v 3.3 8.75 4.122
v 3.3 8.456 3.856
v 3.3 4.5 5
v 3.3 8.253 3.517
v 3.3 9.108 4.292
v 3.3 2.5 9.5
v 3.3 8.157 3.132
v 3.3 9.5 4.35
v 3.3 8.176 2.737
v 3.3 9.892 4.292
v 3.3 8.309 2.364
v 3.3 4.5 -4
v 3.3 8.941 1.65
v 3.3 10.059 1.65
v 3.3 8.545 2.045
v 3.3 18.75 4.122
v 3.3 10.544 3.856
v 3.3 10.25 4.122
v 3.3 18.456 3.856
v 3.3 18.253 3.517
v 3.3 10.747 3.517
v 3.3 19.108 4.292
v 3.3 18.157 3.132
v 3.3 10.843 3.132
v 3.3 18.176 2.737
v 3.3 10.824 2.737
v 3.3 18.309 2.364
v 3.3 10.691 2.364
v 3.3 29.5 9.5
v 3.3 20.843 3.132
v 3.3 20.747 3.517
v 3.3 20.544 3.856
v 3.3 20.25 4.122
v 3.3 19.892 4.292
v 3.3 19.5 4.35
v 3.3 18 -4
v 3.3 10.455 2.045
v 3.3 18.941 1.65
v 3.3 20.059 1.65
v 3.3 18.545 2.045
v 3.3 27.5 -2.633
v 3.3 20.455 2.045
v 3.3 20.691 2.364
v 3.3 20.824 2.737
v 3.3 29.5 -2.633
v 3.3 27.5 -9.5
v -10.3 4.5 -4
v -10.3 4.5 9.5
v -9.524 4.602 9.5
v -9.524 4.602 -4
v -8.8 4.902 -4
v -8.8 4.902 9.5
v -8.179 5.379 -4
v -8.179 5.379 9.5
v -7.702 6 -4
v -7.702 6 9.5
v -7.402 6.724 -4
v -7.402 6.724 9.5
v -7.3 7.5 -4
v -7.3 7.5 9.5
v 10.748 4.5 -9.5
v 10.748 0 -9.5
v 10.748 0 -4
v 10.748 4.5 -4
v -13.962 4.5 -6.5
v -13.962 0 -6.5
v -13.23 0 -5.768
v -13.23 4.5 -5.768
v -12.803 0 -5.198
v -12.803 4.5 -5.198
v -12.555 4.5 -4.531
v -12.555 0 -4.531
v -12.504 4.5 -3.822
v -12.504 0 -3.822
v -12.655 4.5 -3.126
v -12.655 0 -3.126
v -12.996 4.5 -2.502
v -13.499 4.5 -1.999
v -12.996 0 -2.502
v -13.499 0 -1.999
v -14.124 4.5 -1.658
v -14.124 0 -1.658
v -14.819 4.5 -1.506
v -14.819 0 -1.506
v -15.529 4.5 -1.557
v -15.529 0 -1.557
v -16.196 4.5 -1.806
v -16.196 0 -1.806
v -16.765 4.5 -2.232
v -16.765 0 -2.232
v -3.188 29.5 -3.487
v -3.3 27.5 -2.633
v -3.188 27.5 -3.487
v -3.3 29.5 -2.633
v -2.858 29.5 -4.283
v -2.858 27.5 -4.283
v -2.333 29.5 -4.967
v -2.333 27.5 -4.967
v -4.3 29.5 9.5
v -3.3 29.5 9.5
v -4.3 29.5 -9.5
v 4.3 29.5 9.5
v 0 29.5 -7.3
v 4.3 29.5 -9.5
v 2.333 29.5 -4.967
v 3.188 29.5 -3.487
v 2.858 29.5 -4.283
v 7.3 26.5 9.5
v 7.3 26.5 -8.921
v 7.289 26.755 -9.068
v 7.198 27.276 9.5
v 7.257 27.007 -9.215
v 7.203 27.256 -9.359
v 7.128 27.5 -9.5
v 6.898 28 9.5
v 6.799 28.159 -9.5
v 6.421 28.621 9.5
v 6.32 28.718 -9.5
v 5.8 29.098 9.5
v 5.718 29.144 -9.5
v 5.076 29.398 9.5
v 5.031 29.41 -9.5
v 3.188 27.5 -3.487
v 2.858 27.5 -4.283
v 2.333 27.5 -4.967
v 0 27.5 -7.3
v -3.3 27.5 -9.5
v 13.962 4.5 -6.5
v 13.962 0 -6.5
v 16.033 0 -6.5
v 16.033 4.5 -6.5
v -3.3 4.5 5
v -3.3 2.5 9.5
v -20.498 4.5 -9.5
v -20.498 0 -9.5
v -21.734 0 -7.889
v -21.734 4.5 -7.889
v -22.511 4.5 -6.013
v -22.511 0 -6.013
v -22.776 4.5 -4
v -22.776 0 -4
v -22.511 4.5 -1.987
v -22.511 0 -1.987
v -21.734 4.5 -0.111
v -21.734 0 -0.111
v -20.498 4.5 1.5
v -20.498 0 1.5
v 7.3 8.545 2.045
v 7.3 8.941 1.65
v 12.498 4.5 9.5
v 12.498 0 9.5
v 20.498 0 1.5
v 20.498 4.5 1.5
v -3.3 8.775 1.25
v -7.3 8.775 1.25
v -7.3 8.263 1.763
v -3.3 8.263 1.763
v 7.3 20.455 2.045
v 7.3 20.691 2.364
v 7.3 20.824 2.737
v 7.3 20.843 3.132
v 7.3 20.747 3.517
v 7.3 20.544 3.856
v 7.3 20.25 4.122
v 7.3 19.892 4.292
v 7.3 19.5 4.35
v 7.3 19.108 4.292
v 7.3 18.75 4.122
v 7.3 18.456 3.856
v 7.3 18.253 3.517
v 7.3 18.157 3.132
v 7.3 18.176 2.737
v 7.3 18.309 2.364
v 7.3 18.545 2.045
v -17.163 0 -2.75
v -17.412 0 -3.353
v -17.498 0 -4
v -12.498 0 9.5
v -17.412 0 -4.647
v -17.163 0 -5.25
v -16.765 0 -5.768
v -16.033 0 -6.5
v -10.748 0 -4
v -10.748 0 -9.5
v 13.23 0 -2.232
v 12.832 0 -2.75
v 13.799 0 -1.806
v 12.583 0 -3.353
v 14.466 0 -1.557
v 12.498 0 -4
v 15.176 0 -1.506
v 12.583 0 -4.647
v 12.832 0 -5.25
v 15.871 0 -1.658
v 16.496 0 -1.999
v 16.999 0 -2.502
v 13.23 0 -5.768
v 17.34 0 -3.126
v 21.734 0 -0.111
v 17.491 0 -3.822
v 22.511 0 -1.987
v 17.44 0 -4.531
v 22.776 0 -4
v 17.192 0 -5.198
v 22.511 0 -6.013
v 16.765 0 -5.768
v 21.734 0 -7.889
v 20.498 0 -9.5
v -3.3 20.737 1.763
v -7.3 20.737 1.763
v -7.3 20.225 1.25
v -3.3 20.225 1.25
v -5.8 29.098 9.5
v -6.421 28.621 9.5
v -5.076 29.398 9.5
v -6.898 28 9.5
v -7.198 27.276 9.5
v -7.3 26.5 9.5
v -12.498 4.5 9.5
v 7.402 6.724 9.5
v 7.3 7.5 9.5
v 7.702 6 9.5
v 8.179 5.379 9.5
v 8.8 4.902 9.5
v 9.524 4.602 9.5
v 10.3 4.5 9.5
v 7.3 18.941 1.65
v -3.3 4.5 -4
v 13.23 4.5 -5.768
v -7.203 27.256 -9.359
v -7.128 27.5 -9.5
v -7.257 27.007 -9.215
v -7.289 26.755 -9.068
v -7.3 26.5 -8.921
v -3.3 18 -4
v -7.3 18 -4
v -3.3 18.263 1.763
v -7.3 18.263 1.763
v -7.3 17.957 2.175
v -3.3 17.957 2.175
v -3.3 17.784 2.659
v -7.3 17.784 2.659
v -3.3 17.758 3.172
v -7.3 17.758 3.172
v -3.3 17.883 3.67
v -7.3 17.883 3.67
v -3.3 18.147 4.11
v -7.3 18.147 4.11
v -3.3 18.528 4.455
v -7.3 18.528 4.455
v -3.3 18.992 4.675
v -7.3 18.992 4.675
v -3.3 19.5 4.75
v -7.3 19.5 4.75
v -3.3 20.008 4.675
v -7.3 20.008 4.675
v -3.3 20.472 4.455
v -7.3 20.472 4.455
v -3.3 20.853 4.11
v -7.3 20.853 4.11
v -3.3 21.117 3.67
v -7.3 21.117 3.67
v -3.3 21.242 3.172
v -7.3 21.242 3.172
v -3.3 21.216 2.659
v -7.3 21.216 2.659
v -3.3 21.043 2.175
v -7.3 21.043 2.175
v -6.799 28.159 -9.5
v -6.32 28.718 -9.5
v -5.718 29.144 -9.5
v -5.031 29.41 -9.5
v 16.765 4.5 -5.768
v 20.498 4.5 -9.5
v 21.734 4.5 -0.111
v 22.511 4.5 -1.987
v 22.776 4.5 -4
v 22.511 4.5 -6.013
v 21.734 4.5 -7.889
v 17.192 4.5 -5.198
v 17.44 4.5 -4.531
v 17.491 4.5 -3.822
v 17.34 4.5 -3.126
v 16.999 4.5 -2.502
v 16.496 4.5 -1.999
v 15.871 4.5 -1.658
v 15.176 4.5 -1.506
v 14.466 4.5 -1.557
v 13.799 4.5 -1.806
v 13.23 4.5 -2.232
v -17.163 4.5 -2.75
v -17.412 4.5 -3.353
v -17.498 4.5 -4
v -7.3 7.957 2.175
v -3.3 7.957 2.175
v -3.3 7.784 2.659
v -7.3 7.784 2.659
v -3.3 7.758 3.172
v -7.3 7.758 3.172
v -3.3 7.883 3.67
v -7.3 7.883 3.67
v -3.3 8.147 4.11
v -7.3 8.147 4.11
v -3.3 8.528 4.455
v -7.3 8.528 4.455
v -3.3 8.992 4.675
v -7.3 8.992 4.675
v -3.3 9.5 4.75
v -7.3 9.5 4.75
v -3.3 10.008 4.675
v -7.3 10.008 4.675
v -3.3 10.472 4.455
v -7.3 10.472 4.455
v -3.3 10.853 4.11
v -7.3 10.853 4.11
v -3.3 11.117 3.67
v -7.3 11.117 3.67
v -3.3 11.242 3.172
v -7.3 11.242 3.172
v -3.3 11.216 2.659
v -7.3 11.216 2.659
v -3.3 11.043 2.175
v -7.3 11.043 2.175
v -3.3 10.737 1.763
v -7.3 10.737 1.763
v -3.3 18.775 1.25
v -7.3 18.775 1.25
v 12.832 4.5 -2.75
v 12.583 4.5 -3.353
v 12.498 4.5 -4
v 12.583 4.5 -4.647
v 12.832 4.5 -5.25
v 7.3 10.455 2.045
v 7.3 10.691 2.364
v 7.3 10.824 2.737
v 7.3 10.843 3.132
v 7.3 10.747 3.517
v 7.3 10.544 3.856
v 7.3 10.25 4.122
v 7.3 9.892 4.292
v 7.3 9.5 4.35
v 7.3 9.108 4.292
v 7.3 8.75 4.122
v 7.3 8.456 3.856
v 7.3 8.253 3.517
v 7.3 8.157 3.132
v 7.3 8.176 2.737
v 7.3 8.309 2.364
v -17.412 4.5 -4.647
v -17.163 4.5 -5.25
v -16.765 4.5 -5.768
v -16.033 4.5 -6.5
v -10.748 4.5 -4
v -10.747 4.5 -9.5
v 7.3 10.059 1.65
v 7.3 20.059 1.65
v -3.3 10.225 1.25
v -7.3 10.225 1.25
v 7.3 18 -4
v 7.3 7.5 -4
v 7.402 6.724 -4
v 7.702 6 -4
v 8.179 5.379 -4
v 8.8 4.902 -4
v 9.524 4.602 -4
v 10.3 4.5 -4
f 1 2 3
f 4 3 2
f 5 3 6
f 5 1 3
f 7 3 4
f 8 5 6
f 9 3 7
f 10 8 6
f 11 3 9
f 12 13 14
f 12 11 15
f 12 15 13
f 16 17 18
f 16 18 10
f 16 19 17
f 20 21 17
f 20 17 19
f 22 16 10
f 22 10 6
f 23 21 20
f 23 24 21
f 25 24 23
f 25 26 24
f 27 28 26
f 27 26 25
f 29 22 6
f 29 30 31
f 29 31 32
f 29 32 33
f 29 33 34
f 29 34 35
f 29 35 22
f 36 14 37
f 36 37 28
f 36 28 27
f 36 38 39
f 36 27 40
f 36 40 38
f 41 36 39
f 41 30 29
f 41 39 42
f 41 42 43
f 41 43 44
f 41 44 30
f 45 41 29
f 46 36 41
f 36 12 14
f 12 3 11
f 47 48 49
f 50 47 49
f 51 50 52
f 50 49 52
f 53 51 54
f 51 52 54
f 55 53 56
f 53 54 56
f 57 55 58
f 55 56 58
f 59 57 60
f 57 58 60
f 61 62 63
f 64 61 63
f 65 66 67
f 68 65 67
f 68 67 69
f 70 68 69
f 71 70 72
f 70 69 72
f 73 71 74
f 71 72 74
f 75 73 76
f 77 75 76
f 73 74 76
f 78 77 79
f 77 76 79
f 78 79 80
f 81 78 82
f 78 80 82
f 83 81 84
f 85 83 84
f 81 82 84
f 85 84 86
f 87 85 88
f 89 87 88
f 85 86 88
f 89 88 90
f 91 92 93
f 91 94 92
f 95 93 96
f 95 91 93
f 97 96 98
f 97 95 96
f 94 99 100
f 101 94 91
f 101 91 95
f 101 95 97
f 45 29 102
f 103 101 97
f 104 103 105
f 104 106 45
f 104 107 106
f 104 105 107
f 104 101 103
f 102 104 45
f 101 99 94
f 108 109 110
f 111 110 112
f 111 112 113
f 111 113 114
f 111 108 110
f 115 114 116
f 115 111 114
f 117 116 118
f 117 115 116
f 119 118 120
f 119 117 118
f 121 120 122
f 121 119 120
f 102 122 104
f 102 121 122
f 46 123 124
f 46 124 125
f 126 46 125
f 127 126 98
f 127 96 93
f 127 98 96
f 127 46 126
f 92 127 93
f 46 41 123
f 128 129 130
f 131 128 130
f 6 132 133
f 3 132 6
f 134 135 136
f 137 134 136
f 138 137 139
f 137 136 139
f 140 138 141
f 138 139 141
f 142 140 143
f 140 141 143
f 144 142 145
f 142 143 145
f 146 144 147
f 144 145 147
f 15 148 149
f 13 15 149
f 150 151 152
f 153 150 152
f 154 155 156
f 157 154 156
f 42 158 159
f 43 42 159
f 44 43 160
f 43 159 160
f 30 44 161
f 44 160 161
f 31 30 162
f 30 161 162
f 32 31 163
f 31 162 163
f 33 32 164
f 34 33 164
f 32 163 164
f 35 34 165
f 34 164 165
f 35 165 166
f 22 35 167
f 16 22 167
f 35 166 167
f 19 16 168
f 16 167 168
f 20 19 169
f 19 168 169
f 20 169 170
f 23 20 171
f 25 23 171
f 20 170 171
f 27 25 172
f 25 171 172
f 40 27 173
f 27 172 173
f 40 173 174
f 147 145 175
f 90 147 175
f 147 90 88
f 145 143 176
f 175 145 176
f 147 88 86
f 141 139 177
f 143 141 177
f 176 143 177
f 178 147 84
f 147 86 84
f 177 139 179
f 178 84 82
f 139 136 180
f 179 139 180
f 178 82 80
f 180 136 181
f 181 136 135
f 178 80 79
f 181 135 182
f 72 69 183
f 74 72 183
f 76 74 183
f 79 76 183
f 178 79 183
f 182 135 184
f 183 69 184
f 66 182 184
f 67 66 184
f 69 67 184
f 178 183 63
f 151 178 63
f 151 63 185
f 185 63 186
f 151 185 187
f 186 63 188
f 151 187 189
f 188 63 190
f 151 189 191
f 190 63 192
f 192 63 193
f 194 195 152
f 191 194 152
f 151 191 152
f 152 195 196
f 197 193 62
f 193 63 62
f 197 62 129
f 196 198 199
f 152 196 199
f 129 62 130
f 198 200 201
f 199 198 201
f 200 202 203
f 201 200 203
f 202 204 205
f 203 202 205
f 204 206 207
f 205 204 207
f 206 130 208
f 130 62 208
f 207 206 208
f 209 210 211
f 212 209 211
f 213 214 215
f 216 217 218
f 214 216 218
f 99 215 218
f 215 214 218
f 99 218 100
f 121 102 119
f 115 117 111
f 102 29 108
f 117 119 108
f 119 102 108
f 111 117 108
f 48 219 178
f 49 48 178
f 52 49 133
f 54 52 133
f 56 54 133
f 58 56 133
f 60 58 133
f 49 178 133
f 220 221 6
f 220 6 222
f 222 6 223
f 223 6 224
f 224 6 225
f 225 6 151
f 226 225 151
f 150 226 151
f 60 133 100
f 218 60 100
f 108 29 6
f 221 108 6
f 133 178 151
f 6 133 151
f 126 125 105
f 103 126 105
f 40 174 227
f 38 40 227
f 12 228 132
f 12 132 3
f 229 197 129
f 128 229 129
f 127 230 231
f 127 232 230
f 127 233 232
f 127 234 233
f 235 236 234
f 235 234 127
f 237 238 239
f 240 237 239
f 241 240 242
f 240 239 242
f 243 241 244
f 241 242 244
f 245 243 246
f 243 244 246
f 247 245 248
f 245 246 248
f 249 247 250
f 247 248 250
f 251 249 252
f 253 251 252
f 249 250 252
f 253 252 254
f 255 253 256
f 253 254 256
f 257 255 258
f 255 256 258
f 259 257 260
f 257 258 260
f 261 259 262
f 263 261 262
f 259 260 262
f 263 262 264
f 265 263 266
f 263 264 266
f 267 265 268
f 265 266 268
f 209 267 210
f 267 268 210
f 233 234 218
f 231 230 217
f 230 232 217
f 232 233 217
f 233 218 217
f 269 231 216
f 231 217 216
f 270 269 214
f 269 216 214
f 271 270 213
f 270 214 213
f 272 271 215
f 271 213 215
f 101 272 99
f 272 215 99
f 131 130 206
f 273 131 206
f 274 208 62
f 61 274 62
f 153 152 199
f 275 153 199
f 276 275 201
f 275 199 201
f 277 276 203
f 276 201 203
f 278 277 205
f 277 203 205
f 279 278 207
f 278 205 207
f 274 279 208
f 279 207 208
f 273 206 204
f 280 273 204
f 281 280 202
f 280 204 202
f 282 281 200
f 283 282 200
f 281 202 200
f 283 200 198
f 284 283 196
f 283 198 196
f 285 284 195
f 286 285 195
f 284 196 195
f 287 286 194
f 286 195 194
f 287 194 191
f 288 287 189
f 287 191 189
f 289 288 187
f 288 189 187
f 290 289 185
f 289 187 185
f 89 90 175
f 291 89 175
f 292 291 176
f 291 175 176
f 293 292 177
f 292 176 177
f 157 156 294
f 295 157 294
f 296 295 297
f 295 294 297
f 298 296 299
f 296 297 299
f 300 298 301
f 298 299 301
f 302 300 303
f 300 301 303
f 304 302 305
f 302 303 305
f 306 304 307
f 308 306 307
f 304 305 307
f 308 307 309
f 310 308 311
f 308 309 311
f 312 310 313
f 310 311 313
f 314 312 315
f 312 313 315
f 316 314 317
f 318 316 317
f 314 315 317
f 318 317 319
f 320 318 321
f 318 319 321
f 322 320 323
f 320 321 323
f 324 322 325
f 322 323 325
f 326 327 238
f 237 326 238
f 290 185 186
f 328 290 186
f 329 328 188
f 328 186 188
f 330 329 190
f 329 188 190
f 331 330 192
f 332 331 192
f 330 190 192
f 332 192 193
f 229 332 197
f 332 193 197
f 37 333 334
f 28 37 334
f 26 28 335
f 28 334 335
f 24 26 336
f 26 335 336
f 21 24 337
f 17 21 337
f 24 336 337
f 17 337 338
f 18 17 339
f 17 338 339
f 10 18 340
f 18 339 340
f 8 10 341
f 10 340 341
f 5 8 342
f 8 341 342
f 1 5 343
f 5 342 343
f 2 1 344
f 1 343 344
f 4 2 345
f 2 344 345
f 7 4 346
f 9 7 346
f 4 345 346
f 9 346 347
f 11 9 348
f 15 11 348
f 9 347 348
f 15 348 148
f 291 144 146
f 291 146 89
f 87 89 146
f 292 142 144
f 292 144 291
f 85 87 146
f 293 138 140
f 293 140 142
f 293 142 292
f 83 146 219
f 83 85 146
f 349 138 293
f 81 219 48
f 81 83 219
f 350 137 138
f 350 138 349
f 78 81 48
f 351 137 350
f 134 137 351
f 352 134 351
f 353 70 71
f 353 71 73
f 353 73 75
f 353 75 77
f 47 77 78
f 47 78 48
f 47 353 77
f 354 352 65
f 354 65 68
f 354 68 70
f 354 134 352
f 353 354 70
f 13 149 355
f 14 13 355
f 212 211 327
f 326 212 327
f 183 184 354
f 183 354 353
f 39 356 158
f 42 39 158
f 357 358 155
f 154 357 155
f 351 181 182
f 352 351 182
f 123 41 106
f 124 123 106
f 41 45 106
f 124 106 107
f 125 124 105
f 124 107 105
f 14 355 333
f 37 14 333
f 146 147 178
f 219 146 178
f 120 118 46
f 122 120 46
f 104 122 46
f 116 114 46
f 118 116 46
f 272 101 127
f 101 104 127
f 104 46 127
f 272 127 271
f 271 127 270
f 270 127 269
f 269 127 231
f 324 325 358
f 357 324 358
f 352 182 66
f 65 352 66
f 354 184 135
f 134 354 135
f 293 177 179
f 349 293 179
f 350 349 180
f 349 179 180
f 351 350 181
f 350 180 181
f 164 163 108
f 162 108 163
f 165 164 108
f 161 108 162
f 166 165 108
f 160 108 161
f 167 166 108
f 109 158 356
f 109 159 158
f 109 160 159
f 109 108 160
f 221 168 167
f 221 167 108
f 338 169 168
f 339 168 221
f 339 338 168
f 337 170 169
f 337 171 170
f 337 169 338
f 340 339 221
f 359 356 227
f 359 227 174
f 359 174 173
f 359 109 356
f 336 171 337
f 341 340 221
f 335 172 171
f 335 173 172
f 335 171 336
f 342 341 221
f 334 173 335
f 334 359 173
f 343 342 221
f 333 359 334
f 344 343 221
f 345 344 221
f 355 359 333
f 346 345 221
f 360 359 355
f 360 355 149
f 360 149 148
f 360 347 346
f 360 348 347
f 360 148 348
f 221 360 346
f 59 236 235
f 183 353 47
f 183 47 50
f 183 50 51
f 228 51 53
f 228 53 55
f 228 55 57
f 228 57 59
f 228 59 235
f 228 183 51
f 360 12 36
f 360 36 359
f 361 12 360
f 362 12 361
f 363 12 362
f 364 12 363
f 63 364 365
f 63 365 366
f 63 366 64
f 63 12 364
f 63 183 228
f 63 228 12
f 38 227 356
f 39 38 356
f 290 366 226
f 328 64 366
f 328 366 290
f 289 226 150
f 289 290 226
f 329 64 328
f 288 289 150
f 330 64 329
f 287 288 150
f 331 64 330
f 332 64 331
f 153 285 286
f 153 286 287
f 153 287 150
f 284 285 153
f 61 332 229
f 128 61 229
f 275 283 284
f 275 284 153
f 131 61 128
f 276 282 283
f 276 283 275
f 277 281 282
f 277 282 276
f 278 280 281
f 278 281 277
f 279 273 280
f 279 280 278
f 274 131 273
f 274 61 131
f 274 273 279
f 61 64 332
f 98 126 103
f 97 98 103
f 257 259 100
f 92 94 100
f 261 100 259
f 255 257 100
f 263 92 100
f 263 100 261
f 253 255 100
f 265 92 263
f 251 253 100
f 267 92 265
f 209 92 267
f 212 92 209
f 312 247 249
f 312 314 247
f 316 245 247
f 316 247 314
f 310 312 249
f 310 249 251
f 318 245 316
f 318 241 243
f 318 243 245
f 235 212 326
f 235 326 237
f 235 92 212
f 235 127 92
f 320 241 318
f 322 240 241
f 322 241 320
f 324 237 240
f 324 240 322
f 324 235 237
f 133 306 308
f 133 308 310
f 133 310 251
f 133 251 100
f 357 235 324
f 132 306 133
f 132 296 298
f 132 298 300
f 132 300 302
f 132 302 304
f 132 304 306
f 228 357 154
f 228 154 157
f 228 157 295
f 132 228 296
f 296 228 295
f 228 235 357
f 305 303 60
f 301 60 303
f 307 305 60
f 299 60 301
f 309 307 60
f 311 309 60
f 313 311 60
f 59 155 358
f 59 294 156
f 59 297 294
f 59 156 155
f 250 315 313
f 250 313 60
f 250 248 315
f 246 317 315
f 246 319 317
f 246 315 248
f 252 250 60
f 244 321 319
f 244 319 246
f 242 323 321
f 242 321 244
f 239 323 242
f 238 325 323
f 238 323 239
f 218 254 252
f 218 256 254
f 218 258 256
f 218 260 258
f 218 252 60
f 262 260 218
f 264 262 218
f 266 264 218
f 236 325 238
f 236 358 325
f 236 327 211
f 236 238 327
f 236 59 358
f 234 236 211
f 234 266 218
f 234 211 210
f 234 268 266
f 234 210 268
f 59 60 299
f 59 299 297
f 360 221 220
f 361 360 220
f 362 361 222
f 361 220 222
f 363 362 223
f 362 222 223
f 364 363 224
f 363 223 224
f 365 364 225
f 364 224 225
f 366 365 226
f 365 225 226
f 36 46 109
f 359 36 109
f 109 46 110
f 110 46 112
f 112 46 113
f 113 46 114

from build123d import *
from OCP.BRepFilletAPI import BRepFilletAPI_MakeChamfer

# Parameters (mm, degrees)
BOSS_EXTRUDE1_DEPTH = 4.5
BOSS_EXTRUDE2_DEPTH = 19
SKETCH4_W           = 6.6
SKETCH4_H           = 4.8
BOSS_EXTRUDE4_DEPTH = 2
SKETCH5_W           = 6.6
SKETCH5_H           = 2
CUT_EXTRUDE1_DEPTH  = 4.5
CUT_EXTRUDE2_REACH  = 45.186
CUT_EXTRUDE4_REACH  = 45.186
SKETCH9_W           = 6.6
SKETCH9_H           = 2
CUT_EXTRUDE5_DEPTH  = 16.8
FILLET3_R           = 3
SKETCH12_W          = 21.495
SKETCH12_H          = 5.5
CUT_EXTRUDE8_DEPTH  = 18
FILLET7_R           = 3
CHAMFER2_SIZE2      = 2
CHAMFER2_SIZE       = 4.5
CHAMFER3_SIZE       = 3.3
FILLET8_R           = 3.3
CHAMFER4_SIZE       = 9.5
CHAMFER4_SIZE_2     = 5.5


with BuildPart() as part:
    # Sketch1 → Boss-Extrude1 (new body)
    with BuildSketch(Plane(origin=(0, 0, 0), x_dir=(1, 0, 0), z_dir=(0, 1, 0))):
        with BuildLine():
            Line((-20.4975, -1.5), (-12.4975, -9.5))
            Line((-12.4975, -9.5), (12.4975, -9.5))
            Line((12.4975, -9.5), (20.4975, -1.5))
            ThreePointArc((20.4975, -1.5), (22.775674593, 4), (20.4975, 9.5))
            Line((20.4975, 9.5), (-20.4975, 9.5))
            ThreePointArc((-20.4975, 9.5), (-22.775674593, 4), (-20.4975, -1.5))
        make_face()
        with BuildLine():
            Line((-16.765266953, 5.767766953), (-16.033033906, 6.5))
            Line((-16.033033906, 6.5), (-13.961966094, 6.5))
            Line((-13.961966094, 6.5), (-13.229733047, 5.767766953))
            ThreePointArc((-13.229733047, 5.767766953), (-13.229733045, 2.232233049), (-16.765266949, 2.232233043))
            ThreePointArc((-16.765266949, 2.232233043), (-17.30719883, 3.043291416), (-17.4975, 4))
            ThreePointArc((-17.4975, 4), (-17.307198831, 4.956708581), (-16.765266953, 5.767766953))
        make_face(mode=Mode.SUBTRACT)
        with BuildLine():
            Line((13.229733047, 5.767766953), (13.961966094, 6.5))
            Line((13.961966094, 6.5), (16.033033906, 6.5))
            Line((16.033033906, 6.5), (16.765266953, 5.767766953))
            ThreePointArc((16.765266953, 5.767766953), (16.765266949, 2.232233043), (13.229733038, 2.232233056))
            ThreePointArc((13.229733038, 2.232233056), (12.4975, 4.000000006), (13.229733047, 5.767766953))
        make_face(mode=Mode.SUBTRACT)
    extrude(amount=BOSS_EXTRUDE1_DEPTH)

    # Sketch2 → Boss-Extrude2 (add, through all)
    with BuildSketch(Plane(origin=(0, 0, -9.5), x_dir=(-1, 0, 0), z_dir=(0, 0, -1))):
        Polygon((-7.3, 4.5), (-3.3, 4.5), (-3.3, 27.5), (3.3, 27.5), (3.3, 4.5), (7.3, 4.5), (7.3, 29.5), (-7.3, 29.5), align=None)
    extrude(amount=-BOSS_EXTRUDE2_DEPTH)

    # Sketch4 → Boss-Extrude4 (add)
    with BuildSketch(Plane(origin=(0, 4.5, 0), x_dir=(1, 0, 0), z_dir=(0, 1, 0))):
        with Locations((0, 7.1)):
            Rectangle(SKETCH4_W, SKETCH4_H)
    extrude(amount=BOSS_EXTRUDE4_DEPTH)

    # Sketch5 → Cut-Extrude1 (cut)
    with BuildSketch(Plane.XY.offset(9.5)):
        with Locations((0, 3.5)):
            Rectangle(SKETCH5_W, SKETCH5_H)
    extrude(amount=-CUT_EXTRUDE1_DEPTH, mode=Mode.SUBTRACT)

    # Sketch6 → Cut-Extrude2 (cut, up to next)
    with BuildSketch(Plane(origin=(7.3, 0, 0), x_dir=(0, 0, -1), z_dir=(1, 0, 0)), mode=Mode.PRIVATE) as cut_extrude2_sk1:
        with BuildLine():
            Line((-1.65, 20.059188309), (-2.045405845, 20.454594155))
            ThreePointArc((-2.045405845, 20.454594155), (-4.35, 19.5), (-2.045405845, 18.545405845))
            Line((-2.045405845, 18.545405845), (-1.65, 18.940811691))
            Line((-1.65, 18.940811691), (-1.65, 20.059188309))
        make_face()
    cut_extrude2_tool1 = extrude(cut_extrude2_sk1.sketch, amount=-CUT_EXTRUDE2_REACH, mode=Mode.PRIVATE) & part.part
    # Sketch6 → Cut-Extrude2 (cut, up to next)
    with BuildSketch(Plane(origin=(7.3, 0, 0), x_dir=(0, 0, -1), z_dir=(1, 0, 0)), mode=Mode.PRIVATE) as cut_extrude2_sk2:
        with BuildLine():
            Line((-1.65, 10.059188309), (-2.045405845, 10.454594155))
            ThreePointArc((-2.045405845, 10.454594155), (-4.35, 9.5), (-2.045405845, 8.545405845))
            Line((-2.045405845, 8.545405845), (-1.65, 8.940811691))
            Line((-1.65, 8.940811691), (-1.65, 10.059188309))
        make_face()
    cut_extrude2_tool2 = extrude(cut_extrude2_sk2.sketch, amount=-CUT_EXTRUDE2_REACH, mode=Mode.PRIVATE) & part.part
    add(cut_extrude2_tool1.solids().sort_by_distance((7.3, 19.5, 2.982857))[0], mode=Mode.SUBTRACT)
    add(cut_extrude2_tool2.solids().sort_by_distance((7.3, 9.5, 2.982857))[0], mode=Mode.SUBTRACT)

    # Sketch8 → Cut-Extrude4 (cut, up to next)
    with BuildSketch(Plane.ZY.offset(7.3), mode=Mode.PRIVATE) as cut_extrude4_sk1:
        with BuildLine():
            Line((1.25, 10.224873734), (1.25, 8.775126266))
            Line((1.25, 8.775126266), (1.762563133, 8.262563133))
            ThreePointArc((1.762563133, 8.262563133), (4.75, 9.5), (1.762563133, 10.737436867))
            Line((1.762563133, 10.737436867), (1.25, 10.224873734))
        make_face()
    cut_extrude4_tool1 = extrude(cut_extrude4_sk1.sketch, amount=-CUT_EXTRUDE4_REACH, mode=Mode.PRIVATE) & part.part
    # Sketch8 → Cut-Extrude4 (cut, up to next)
    with BuildSketch(Plane.ZY.offset(7.3), mode=Mode.PRIVATE) as cut_extrude4_sk2:
        with BuildLine():
            Line((1.25, 20.224873734), (1.25, 18.775126266))
            Line((1.25, 18.775126266), (1.762563133, 18.262563133))
            ThreePointArc((1.762563133, 18.262563133), (4.75, 19.5), (1.762563133, 20.737436867))
            Line((1.762563133, 20.737436867), (1.25, 20.224873734))
        make_face()
    cut_extrude4_tool2 = extrude(cut_extrude4_sk2.sketch, amount=-CUT_EXTRUDE4_REACH, mode=Mode.PRIVATE) & part.part
    add(cut_extrude4_tool1.solids().sort_by_distance((-7.3, 9.5, 2.977778))[0], mode=Mode.SUBTRACT)
    add(cut_extrude4_tool2.solids().sort_by_distance((-7.3, 19.5, 2.977778))[0], mode=Mode.SUBTRACT)

    # Sketch9 → Cut-Extrude5 (cut)
    with BuildSketch(Plane.XY.offset(9.5)):
        with Locations((0, 28.5)):
            Rectangle(SKETCH9_W, SKETCH9_H)
    extrude(amount=-CUT_EXTRUDE5_DEPTH, mode=Mode.SUBTRACT)

    # Fillet3
    fillet3_edges = [part.edges().sort_by_distance(p)[0] for p in [
        (-7.3, 4.5, 0),
        (7.3, 4.5, 0),
    ]]
    fillet(fillet3_edges, radius=FILLET3_R)

    # Sketch12 → Cut-Extrude8 (cut)
    with BuildSketch(Plane.XZ):
        with Locations((0, -6.75)):
            Rectangle(SKETCH12_W, SKETCH12_H)
    extrude(amount=-CUT_EXTRUDE8_DEPTH, mode=Mode.SUBTRACT)

    # Fillet7
    fillet7_edges = [part.edges().sort_by_distance(p)[0] for p in [
        (-7.3, 29.5, 0),
        (7.3, 29.5, 0),
    ]]
    fillet(fillet7_edges, radius=FILLET7_R)

    # Chamfer2
    chamfer2_edges = [part.edges().sort_by_distance(p)[0] for p in [
        (0, 2.5, 5),
    ]]
    chamfer2_side = [part.faces().sort_by_distance(p)[0] for p in [
        (0, 2.5, 5.04),
    ]]
    chamfer(chamfer2_edges, length=CHAMFER2_SIZE - 0.0001, length2=CHAMFER2_SIZE2 - 0.0001, reference=chamfer2_side[0])  # a hair under: the kernel refuses the full size

    # Chamfer3
    chamfer3_edges = [part.edges().sort_by_distance(p)[0] for p in [
        (-3.3, 28.5, -7.3),
        (3.3, 28.5, -7.3),
    ]]
    chamfer(chamfer3_edges, length=CHAMFER3_SIZE - 0.0001)  # a hair under: the kernel refuses the full size

    # Fillet8
    fillet8_edges = [part.edges().sort_by_distance(p)[0] for p in [
        (-3.3, 28.5, -4.0001),
        (3.3, 28.5, -4.0001),
    ]]
    fillet(fillet8_edges, radius=FILLET8_R)

    # Chamfer4
    chamfer4_edges_1 = [part.edges().sort_by_distance(p)[0] for p in [
        (-5.3, 18, -9.5),
    ]]
    chamfer4_side_1 = [part.faces().sort_by_distance(p)[0] for p in [
        (-5.3, 18.11, -9.5),
    ]]
    chamfer4_edges_2 = [part.edges().sort_by_distance(p)[0] for p in [
        (5.3, 18, -9.5),
    ]]
    chamfer4_side_2 = [part.faces().sort_by_distance(p)[0] for p in [
        (5.3, 18, -9.39),
    ]]
    chamfer4 = BRepFilletAPI_MakeChamfer(part.part.solid().wrapped)
    for e in chamfer4_edges_1:
        chamfer4.Add(CHAMFER4_SIZE - 0.0001, CHAMFER4_SIZE_2 - 0.0001, e.wrapped, chamfer4_side_1[0].wrapped)
    for e in chamfer4_edges_2:
        chamfer4.Add(CHAMFER4_SIZE_2 - 0.0001, CHAMFER4_SIZE - 0.0001, e.wrapped, chamfer4_side_2[0].wrapped)
    add(Compound.cast(chamfer4.Shape()), mode=Mode.REPLACE)  # a hair under: the kernel refuses the full size


solid = part.part
